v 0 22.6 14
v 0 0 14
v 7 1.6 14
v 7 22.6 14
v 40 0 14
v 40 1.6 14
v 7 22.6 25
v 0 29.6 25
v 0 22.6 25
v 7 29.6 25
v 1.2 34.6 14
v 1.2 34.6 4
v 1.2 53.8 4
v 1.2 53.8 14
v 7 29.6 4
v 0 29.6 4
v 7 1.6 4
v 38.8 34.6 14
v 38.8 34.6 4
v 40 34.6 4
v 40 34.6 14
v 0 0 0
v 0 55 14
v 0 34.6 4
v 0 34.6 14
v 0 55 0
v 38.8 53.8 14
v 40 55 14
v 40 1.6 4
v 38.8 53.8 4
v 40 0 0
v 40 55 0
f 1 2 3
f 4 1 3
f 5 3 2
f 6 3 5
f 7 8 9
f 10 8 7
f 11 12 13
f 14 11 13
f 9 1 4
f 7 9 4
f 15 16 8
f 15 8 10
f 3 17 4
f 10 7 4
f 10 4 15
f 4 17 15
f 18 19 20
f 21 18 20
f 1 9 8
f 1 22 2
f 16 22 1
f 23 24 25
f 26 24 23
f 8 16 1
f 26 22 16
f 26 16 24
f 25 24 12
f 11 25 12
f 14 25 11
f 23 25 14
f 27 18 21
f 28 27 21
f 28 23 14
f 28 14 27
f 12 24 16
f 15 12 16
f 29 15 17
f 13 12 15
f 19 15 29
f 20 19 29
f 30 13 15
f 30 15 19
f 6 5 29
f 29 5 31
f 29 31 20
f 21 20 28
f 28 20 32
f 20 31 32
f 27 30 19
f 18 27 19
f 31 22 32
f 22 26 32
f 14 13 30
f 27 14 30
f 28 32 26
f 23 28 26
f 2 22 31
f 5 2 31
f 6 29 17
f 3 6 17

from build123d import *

# Parameters (mm, degrees)
F1_DEPTH = 4
F2_DEPTH = 14
F0_W     = 7
F0_H     = 7
F3_DEPTH = 25


with BuildPart() as f1:
    # F0 (on Top) → F1 (new body)
    with BuildSketch(Plane.XY):
        Polygon((7, 1.6), (40, 1.6), (40, 34.6), (38.8, 34.6), (38.8, 53.8), (1.2, 53.8), (1.2, 34.6), (0, 34.6), (0, 29.6), (7, 29.6), (7, 22.6), align=None)
    extrude(amount=F1_DEPTH)

    # F0 (on Top) → F2 (join)
    with BuildSketch(Plane.XY):
        Polygon((0, 22.6), (0, 0), (40, 0), (40, 1.6), (7, 1.6), (7, 22.6), align=None)
        Polygon((38.8, 34.6), (40, 34.6), (40, 55), (0, 55), (0, 34.6), (1.2, 34.6), (1.2, 53.8), (38.8, 53.8), align=None)
    extrude(amount=F2_DEPTH)

    # F0 (on Top) → F3 (join)
    with BuildSketch(Plane.XY):
        with Locations((3.5, 26.1)):
            Rectangle(F0_W, F0_H)
    extrude(amount=F3_DEPTH)


solid = f1.part
